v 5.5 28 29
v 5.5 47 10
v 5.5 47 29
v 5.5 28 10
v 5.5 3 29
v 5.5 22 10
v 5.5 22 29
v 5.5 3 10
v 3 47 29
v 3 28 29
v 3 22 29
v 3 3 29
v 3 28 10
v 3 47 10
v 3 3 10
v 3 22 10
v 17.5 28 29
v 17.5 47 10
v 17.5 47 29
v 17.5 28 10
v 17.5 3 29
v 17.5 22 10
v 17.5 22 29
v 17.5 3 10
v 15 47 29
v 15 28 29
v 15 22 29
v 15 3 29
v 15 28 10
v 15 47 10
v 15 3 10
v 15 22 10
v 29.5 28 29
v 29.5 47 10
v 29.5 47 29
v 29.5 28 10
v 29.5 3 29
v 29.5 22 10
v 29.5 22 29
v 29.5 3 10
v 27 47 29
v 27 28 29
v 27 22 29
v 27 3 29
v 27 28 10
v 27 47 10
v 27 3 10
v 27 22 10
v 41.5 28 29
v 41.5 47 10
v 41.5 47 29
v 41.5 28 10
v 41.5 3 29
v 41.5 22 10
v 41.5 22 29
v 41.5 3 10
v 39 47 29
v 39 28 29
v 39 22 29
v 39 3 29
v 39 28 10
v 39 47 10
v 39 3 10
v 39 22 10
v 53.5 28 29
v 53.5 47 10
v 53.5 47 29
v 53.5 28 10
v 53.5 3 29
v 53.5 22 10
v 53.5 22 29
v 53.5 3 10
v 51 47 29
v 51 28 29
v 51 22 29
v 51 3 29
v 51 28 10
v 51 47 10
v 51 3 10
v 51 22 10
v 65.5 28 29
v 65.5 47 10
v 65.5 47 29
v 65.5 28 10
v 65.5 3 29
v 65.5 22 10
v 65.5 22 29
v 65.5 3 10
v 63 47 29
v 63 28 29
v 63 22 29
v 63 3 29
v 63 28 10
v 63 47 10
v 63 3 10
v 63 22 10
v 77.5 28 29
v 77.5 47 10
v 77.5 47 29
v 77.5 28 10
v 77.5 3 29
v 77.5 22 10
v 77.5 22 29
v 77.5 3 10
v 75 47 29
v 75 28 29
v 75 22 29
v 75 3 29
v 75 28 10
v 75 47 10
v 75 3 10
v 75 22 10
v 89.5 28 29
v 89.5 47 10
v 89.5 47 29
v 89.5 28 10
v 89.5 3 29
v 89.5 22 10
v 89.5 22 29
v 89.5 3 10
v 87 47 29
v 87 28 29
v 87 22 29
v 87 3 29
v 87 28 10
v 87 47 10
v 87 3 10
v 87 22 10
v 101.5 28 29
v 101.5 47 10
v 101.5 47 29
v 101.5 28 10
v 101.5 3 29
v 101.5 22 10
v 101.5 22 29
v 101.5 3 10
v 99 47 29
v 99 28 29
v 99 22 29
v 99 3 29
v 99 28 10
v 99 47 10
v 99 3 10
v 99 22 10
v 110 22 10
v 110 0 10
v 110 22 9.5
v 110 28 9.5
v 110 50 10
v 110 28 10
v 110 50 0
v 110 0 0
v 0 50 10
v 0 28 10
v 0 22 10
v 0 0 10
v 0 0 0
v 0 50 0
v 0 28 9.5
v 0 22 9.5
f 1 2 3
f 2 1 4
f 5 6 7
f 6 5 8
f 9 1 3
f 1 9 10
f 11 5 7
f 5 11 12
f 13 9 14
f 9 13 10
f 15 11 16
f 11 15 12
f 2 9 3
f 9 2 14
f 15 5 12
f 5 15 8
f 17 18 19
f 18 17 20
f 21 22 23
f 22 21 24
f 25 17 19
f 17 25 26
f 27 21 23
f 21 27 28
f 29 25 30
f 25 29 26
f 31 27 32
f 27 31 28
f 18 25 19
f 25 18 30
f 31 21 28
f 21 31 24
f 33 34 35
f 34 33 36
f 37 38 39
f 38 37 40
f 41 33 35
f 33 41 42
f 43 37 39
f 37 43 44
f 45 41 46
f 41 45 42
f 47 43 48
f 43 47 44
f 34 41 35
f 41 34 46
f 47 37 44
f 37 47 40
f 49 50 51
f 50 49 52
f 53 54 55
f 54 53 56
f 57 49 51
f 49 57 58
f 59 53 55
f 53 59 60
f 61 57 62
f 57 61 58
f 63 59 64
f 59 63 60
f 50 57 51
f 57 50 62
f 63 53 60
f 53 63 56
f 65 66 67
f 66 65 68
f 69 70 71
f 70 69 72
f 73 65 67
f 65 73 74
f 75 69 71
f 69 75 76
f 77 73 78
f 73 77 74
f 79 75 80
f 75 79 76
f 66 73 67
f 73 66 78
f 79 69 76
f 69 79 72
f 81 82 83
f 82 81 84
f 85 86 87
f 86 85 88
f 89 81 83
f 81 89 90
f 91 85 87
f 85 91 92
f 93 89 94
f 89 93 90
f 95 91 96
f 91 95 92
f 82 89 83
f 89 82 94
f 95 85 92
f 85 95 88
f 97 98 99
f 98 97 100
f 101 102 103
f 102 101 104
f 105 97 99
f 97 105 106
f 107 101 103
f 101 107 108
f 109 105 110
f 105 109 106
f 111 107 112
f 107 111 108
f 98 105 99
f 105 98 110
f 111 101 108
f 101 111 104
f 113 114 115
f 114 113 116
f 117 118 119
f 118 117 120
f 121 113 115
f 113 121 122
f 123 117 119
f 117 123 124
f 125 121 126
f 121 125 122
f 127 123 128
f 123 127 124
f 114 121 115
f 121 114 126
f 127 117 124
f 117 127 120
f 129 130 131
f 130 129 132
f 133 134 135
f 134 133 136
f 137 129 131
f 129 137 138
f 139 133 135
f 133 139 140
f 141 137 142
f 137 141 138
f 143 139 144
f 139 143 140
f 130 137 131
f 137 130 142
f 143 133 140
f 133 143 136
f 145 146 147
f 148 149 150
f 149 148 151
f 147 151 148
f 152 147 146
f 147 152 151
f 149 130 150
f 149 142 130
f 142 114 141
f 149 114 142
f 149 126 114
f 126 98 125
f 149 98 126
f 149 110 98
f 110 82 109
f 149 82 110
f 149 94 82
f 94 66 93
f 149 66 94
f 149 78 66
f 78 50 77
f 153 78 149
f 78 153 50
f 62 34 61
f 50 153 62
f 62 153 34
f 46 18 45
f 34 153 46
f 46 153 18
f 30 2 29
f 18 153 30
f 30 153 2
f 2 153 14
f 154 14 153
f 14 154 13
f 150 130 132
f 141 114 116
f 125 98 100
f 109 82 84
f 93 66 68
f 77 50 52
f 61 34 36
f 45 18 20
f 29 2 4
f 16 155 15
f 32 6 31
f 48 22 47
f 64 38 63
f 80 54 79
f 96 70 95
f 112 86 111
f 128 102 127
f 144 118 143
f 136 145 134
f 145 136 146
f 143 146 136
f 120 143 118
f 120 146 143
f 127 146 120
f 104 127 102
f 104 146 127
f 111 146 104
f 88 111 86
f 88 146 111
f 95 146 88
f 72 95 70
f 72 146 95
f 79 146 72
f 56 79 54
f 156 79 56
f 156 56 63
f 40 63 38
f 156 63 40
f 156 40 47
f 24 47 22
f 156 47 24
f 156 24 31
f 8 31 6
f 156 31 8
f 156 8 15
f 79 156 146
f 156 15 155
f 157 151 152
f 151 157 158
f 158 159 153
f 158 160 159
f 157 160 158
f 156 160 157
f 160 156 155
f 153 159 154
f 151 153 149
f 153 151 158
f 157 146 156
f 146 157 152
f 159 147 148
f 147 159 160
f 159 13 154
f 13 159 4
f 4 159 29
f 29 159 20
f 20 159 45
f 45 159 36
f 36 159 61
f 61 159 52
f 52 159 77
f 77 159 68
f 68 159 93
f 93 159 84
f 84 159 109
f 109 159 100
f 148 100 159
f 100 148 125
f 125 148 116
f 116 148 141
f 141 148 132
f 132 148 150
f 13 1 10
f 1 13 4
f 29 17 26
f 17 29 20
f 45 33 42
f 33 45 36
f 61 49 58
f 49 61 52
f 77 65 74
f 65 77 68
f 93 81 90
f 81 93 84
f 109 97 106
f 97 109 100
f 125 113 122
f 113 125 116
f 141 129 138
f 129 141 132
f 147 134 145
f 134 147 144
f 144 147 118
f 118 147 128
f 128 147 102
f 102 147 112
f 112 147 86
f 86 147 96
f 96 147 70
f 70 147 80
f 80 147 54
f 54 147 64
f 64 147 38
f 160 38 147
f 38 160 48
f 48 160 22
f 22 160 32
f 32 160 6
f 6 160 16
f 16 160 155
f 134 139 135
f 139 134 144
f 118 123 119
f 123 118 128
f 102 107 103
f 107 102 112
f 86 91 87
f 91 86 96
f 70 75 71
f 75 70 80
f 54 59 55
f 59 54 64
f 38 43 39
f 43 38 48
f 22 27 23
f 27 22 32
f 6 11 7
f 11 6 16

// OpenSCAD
$fn = 32;

// ----------------------------------------------------------------------
// Heatsink: slotted fin block
// ----------------------------------------------------------------------

// --- parameters (mm) ---
base_l = 110;             // base length, X
base_w = 50;              // base width, Y
base_t = 10;              // base plate thickness
fin_h = 20;               // fin height above the base
fin_t = 2.5;              // fin thickness
edge = 3;                 // margin from the base ends
pitch = 12;               // fin pitch
slot_w = 6;               // central slot width, Y

n_fins = floor((base_l - 2 * edge - fin_t) / pitch) + 1;  // fin count
total_h = base_t + fin_h - 1;  // overall height

difference() {
union() {
  cube([base_l, base_w, base_t]);
  for (i = [0 : n_fins - 1])
    translate([edge + i * pitch, edge, base_t - 1])
      cube([fin_t, base_w - 2 * edge, fin_h]);
}
  translate([-1, base_w / 2 - slot_w / 2, base_t - 0.5])
    cube([base_l + 2, slot_w, fin_h + 2]);
}
